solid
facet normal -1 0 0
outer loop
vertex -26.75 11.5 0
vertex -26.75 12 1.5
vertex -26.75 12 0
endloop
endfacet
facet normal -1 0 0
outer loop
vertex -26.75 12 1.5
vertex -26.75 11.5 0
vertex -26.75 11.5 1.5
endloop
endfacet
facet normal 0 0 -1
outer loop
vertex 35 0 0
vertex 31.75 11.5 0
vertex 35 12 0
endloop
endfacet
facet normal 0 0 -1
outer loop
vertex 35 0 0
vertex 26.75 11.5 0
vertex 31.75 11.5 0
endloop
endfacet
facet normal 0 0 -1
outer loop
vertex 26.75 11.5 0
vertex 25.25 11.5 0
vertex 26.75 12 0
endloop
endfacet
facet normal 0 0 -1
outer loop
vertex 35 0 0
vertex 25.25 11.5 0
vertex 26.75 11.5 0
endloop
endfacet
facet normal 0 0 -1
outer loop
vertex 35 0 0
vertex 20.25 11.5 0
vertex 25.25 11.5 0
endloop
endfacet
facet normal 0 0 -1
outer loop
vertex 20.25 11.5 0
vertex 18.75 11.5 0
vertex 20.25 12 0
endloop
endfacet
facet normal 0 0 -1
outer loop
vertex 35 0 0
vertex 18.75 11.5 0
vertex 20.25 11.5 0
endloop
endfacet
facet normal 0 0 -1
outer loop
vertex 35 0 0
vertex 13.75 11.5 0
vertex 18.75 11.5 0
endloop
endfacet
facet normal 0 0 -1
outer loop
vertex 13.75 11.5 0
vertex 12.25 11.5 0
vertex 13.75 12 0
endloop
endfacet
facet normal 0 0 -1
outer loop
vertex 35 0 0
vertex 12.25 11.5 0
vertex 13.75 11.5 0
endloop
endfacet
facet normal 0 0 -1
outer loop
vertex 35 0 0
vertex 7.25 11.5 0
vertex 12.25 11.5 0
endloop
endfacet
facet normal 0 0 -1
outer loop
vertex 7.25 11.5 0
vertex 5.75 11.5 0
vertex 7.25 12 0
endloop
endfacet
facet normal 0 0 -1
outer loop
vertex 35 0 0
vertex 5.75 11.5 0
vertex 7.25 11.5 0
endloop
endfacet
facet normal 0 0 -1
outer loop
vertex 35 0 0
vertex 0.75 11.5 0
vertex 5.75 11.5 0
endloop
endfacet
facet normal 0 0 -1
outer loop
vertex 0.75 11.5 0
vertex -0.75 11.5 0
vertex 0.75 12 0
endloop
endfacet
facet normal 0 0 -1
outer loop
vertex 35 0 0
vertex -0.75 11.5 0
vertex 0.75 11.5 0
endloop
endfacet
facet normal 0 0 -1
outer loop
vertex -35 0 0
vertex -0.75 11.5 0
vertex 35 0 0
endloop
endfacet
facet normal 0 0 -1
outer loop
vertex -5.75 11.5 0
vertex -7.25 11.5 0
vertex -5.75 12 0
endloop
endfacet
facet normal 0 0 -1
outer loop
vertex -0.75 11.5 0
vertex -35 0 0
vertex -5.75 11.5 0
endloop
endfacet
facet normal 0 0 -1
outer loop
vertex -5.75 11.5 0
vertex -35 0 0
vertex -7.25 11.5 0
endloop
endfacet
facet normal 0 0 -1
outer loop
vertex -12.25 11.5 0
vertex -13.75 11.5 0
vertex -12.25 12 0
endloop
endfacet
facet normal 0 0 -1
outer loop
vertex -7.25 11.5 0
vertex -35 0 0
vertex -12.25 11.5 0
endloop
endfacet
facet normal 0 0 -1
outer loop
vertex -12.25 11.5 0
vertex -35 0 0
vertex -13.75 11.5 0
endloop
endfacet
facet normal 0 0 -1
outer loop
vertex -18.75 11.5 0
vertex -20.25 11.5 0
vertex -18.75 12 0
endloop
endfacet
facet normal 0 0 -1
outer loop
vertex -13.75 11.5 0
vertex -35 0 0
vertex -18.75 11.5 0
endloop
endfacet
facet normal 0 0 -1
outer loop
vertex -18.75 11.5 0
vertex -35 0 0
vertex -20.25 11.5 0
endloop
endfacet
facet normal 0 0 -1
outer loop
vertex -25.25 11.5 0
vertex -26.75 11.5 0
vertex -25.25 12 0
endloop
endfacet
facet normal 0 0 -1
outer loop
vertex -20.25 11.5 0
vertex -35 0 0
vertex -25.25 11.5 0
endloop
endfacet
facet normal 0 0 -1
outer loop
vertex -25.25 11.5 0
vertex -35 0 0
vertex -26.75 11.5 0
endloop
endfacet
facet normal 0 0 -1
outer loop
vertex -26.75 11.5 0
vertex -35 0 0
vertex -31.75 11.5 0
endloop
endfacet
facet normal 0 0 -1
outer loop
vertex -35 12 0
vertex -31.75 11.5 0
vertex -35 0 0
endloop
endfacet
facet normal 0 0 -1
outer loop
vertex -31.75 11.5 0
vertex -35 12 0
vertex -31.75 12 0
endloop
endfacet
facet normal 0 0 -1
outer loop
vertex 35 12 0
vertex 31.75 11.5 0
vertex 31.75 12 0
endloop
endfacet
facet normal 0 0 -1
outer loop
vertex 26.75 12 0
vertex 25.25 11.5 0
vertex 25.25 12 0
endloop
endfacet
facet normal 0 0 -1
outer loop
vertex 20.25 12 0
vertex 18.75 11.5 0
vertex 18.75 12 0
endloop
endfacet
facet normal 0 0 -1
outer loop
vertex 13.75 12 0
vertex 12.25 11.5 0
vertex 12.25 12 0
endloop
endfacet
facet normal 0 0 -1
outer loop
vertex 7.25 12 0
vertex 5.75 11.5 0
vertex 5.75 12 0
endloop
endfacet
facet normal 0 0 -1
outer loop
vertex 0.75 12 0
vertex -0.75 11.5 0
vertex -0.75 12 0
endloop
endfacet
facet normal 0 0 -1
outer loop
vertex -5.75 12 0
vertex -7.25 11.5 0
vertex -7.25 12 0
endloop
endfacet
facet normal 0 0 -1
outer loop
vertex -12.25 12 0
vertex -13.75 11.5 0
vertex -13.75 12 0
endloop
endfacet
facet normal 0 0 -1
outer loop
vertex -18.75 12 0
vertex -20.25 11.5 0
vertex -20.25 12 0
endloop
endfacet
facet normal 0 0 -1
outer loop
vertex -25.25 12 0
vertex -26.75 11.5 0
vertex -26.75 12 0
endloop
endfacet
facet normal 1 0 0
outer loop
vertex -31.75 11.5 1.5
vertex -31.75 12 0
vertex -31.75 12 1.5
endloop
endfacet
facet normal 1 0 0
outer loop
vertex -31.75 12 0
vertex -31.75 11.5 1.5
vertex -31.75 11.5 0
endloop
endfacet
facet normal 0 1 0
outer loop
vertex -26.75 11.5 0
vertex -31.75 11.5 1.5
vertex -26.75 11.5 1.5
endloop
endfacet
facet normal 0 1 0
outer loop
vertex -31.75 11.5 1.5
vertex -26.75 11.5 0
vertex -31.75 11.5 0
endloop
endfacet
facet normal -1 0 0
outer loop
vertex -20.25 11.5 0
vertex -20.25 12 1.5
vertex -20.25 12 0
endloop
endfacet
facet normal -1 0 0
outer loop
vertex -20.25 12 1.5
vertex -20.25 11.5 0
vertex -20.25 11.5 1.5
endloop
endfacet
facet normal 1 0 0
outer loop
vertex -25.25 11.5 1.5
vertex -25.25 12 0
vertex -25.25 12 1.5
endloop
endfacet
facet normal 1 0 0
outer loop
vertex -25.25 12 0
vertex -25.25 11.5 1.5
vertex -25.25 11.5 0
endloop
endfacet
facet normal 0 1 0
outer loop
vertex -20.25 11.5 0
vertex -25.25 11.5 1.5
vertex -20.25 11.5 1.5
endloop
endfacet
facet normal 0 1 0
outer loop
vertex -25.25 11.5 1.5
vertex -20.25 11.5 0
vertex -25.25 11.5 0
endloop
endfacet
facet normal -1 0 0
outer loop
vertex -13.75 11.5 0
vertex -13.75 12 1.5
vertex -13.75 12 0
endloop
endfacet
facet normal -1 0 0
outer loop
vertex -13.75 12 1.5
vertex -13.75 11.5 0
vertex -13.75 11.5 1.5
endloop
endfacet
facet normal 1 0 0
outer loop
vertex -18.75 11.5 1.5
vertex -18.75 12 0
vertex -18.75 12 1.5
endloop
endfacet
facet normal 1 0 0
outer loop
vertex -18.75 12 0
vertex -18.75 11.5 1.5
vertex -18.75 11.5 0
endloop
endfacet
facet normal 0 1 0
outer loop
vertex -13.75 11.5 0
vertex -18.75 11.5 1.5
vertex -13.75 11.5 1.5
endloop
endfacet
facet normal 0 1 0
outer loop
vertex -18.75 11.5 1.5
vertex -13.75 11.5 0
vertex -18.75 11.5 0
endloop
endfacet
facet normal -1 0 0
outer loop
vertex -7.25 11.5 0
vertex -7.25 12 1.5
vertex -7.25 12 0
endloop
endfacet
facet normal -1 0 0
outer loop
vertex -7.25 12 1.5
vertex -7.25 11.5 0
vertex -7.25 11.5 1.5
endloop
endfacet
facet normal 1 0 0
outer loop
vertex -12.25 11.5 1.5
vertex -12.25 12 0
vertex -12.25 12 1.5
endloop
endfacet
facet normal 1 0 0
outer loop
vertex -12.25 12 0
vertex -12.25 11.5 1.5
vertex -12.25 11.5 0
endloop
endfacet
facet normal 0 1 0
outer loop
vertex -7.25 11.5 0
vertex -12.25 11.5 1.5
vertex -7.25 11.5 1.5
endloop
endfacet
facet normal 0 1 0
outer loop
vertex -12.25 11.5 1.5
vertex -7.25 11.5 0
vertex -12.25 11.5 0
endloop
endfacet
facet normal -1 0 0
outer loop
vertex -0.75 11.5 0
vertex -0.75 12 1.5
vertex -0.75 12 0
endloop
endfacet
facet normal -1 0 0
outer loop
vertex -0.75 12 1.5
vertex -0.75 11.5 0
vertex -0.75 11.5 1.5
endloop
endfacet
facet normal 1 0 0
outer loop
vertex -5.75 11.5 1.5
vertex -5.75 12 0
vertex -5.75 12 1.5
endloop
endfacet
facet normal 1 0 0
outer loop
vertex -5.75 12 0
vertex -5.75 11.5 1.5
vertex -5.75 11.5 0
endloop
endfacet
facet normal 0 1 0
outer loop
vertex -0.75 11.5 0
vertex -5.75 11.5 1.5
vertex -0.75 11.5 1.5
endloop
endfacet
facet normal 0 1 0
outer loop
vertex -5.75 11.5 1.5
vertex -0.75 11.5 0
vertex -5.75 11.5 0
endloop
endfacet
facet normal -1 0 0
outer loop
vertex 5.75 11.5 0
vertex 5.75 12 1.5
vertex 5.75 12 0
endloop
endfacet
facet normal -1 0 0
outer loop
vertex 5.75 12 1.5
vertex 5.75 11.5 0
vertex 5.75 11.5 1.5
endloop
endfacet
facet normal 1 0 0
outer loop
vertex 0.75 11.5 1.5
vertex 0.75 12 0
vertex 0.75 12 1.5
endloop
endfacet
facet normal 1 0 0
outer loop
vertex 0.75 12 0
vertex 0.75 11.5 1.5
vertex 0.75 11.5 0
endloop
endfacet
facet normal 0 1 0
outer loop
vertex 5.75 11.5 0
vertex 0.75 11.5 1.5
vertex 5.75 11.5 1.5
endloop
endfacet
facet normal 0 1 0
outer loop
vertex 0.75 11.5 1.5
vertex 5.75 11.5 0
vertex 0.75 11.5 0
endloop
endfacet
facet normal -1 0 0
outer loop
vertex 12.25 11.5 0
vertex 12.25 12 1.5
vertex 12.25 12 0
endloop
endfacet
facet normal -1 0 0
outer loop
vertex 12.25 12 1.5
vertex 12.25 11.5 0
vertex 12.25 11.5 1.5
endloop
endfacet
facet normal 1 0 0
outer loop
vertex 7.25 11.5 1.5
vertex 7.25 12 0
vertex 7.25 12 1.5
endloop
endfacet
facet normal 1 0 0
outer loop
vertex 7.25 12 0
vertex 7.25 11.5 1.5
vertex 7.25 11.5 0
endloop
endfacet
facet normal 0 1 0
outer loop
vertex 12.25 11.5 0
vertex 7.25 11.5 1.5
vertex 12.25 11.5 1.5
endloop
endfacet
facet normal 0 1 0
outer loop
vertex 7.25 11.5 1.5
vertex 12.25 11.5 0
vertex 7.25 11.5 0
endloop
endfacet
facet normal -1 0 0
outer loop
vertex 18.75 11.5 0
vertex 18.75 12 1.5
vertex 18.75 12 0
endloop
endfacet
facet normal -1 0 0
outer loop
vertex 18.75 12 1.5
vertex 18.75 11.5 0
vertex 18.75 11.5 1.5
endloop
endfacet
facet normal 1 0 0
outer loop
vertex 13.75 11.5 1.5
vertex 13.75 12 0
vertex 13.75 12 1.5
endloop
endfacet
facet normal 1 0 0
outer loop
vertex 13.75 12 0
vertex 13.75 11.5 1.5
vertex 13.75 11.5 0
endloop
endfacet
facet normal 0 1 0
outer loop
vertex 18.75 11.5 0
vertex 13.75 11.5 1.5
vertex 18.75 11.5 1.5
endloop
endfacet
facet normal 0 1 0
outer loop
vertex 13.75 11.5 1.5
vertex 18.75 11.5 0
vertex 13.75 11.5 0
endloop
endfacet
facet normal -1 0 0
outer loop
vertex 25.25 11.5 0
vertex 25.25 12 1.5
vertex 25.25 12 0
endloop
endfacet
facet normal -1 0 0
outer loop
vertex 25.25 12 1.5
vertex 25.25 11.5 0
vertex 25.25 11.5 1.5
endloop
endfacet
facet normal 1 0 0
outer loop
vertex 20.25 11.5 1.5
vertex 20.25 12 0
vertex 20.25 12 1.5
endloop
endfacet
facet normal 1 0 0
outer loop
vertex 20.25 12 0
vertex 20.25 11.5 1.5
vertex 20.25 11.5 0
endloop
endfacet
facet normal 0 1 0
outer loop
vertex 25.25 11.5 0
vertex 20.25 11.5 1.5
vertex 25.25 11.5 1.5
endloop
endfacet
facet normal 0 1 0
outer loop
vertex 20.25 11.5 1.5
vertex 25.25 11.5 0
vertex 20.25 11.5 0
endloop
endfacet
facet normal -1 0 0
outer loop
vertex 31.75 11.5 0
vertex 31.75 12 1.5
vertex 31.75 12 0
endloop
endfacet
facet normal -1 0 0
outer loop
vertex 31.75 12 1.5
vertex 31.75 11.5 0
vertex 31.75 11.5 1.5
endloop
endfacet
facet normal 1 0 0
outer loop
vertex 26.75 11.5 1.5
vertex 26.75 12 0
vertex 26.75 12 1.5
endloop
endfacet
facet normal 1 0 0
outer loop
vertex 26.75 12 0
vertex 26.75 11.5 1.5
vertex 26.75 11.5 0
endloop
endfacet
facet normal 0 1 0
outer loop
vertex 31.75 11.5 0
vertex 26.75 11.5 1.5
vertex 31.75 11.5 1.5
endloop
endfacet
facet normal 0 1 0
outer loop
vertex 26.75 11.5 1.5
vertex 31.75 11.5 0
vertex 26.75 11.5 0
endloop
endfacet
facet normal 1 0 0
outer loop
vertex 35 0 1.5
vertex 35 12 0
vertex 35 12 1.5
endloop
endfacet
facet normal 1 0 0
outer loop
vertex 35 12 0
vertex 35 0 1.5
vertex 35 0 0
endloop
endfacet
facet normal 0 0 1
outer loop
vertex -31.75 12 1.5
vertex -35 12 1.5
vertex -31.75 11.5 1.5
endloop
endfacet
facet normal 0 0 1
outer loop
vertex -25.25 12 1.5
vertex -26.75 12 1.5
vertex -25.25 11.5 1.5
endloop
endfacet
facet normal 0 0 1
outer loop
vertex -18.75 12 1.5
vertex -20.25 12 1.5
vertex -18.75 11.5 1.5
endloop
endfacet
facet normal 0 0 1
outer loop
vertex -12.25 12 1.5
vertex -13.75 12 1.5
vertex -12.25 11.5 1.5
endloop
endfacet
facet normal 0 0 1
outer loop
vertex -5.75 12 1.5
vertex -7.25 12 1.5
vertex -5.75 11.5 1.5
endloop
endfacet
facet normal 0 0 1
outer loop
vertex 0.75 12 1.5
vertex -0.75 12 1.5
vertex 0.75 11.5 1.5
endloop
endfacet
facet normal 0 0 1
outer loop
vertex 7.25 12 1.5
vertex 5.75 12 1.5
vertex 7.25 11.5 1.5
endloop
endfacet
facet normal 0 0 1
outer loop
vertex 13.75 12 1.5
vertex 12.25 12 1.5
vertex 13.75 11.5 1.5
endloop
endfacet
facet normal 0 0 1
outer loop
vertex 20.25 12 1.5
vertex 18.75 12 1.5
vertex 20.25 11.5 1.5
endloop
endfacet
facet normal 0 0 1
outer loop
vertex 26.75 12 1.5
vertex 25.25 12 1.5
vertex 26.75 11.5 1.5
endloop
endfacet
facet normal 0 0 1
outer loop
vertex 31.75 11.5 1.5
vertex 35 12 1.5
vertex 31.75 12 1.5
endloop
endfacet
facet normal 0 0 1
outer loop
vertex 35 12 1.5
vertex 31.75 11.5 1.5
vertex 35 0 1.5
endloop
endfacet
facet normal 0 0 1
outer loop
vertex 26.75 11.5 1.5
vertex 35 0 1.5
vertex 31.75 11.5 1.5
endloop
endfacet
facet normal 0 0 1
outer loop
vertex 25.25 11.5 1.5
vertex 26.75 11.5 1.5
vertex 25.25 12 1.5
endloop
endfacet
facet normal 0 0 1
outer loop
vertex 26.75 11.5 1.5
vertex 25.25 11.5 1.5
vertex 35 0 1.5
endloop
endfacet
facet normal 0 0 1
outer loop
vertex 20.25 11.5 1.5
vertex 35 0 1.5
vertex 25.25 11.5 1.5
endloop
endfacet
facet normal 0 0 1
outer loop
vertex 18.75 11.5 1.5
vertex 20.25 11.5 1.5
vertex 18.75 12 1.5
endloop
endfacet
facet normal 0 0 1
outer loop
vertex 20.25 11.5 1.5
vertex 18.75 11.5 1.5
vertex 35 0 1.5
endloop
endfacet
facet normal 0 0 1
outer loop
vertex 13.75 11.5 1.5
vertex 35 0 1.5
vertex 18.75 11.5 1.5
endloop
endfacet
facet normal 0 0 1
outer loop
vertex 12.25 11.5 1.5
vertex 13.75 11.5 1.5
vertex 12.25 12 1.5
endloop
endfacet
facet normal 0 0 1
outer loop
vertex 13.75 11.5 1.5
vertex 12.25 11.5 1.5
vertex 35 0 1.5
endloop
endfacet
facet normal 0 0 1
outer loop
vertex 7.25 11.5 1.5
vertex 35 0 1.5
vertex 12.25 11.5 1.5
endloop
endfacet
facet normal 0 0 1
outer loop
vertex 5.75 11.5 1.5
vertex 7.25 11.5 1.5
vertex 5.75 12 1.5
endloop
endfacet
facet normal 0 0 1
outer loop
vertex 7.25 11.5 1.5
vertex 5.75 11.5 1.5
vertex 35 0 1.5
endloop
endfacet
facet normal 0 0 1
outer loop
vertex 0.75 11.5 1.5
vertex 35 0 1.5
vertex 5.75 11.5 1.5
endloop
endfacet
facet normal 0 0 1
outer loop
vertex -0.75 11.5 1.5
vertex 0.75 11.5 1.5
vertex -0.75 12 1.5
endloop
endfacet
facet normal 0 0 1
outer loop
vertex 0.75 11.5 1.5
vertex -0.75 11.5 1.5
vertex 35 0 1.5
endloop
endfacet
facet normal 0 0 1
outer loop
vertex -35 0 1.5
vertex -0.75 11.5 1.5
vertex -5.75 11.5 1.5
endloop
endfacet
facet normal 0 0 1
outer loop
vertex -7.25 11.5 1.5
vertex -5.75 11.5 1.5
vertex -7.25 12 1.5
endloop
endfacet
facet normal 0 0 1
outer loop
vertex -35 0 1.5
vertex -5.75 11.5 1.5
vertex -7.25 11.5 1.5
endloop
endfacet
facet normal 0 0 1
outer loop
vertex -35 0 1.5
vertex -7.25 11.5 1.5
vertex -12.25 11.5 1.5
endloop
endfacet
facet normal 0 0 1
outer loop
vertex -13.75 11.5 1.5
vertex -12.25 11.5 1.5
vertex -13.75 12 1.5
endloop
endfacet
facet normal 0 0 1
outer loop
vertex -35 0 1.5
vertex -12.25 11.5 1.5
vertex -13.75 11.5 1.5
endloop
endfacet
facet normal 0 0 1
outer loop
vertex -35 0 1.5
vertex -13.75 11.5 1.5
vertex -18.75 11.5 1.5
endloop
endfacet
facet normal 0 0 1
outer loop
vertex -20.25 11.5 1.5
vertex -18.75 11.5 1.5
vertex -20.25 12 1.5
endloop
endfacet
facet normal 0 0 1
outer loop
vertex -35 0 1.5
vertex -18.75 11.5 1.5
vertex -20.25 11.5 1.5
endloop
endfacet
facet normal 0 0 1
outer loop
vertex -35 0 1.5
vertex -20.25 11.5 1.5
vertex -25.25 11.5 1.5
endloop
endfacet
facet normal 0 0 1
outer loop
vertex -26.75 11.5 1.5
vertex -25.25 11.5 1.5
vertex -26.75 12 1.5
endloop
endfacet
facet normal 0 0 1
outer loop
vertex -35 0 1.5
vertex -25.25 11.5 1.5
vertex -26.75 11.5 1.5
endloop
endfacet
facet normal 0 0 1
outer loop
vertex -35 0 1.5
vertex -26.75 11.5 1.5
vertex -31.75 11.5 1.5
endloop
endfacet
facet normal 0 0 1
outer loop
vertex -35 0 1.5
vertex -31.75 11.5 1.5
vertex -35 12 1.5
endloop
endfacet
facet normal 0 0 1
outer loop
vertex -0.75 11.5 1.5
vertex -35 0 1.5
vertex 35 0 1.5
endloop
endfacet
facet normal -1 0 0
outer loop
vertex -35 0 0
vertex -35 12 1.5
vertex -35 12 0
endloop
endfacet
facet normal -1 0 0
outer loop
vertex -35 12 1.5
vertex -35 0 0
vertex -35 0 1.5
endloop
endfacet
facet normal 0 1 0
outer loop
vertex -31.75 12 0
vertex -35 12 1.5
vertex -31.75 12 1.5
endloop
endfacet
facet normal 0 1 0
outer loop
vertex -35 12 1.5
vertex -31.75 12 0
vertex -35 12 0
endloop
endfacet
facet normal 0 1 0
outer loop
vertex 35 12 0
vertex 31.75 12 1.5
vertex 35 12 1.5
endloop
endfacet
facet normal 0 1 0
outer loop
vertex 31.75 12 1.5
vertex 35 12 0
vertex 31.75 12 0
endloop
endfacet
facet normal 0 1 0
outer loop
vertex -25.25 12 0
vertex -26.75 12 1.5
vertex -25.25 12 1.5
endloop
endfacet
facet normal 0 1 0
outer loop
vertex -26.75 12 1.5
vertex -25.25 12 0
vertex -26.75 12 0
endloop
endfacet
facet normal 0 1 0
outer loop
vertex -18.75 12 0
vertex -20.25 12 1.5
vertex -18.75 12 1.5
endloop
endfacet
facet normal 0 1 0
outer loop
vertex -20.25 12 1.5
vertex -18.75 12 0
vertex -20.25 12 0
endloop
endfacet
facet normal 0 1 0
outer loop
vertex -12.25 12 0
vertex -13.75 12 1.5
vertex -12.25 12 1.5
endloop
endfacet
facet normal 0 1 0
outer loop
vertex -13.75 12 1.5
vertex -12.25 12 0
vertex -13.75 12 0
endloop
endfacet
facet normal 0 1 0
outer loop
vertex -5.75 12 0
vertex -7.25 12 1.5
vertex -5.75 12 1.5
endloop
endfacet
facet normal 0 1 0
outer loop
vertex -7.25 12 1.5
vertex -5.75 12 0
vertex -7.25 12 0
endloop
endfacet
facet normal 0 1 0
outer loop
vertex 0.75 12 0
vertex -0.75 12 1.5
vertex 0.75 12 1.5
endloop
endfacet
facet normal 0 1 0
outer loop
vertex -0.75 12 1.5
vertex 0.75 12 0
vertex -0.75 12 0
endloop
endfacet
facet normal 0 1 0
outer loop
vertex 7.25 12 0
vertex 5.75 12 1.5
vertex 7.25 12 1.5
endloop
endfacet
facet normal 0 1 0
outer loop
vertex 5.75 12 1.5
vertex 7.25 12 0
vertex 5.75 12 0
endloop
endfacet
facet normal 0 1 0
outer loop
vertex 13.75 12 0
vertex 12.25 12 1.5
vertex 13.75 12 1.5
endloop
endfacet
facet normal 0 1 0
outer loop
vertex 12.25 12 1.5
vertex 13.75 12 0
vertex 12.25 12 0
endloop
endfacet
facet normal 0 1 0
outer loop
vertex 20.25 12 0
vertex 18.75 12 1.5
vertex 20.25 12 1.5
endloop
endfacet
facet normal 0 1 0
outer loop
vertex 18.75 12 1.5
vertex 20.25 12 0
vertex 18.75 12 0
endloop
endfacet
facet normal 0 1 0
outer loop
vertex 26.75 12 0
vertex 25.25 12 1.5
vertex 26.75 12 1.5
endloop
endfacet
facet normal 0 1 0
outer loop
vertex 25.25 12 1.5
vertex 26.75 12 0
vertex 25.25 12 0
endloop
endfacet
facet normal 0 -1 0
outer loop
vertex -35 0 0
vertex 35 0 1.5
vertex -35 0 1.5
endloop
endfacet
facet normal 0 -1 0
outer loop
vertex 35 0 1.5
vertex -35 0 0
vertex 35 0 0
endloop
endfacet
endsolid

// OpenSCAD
// 10-well agarose gel comb - printed lying flat
// Units: mm

$fn = 64;

// ---- Dimensions ----
spine_len    = 70;    // spine length (X)
spine_wid    = 12;    // spine width (Y)
spine_thk    = 1.5;   // spine thickness (Z)

tooth_count  = 10;    // number of teeth
tooth_w      = 5.0;   // tooth width (X)
tooth_len    = 12;    // tooth length (Y)
tooth_gap    = 1.5;   // gap between teeth (X)

eps          = 0.5;   // cutter overshoot

// ---- Derived ----
pitch        = tooth_w + tooth_gap;
row_start_x  = -(tooth_count - 1) * pitch / 2;

// ---- Model ----
difference() {
    // Spine
    translate([-spine_len/2, 0, 0])
        cube([spine_len, spine_wid, spine_thk]);

    // Teeth
    for (i = [0 : tooth_count - 1])
        translate([row_start_x + i * pitch - tooth_w/2,
                   spine_wid - eps,
                   0])
            cube([tooth_w, tooth_len + eps, spine_thk + eps]);
}
